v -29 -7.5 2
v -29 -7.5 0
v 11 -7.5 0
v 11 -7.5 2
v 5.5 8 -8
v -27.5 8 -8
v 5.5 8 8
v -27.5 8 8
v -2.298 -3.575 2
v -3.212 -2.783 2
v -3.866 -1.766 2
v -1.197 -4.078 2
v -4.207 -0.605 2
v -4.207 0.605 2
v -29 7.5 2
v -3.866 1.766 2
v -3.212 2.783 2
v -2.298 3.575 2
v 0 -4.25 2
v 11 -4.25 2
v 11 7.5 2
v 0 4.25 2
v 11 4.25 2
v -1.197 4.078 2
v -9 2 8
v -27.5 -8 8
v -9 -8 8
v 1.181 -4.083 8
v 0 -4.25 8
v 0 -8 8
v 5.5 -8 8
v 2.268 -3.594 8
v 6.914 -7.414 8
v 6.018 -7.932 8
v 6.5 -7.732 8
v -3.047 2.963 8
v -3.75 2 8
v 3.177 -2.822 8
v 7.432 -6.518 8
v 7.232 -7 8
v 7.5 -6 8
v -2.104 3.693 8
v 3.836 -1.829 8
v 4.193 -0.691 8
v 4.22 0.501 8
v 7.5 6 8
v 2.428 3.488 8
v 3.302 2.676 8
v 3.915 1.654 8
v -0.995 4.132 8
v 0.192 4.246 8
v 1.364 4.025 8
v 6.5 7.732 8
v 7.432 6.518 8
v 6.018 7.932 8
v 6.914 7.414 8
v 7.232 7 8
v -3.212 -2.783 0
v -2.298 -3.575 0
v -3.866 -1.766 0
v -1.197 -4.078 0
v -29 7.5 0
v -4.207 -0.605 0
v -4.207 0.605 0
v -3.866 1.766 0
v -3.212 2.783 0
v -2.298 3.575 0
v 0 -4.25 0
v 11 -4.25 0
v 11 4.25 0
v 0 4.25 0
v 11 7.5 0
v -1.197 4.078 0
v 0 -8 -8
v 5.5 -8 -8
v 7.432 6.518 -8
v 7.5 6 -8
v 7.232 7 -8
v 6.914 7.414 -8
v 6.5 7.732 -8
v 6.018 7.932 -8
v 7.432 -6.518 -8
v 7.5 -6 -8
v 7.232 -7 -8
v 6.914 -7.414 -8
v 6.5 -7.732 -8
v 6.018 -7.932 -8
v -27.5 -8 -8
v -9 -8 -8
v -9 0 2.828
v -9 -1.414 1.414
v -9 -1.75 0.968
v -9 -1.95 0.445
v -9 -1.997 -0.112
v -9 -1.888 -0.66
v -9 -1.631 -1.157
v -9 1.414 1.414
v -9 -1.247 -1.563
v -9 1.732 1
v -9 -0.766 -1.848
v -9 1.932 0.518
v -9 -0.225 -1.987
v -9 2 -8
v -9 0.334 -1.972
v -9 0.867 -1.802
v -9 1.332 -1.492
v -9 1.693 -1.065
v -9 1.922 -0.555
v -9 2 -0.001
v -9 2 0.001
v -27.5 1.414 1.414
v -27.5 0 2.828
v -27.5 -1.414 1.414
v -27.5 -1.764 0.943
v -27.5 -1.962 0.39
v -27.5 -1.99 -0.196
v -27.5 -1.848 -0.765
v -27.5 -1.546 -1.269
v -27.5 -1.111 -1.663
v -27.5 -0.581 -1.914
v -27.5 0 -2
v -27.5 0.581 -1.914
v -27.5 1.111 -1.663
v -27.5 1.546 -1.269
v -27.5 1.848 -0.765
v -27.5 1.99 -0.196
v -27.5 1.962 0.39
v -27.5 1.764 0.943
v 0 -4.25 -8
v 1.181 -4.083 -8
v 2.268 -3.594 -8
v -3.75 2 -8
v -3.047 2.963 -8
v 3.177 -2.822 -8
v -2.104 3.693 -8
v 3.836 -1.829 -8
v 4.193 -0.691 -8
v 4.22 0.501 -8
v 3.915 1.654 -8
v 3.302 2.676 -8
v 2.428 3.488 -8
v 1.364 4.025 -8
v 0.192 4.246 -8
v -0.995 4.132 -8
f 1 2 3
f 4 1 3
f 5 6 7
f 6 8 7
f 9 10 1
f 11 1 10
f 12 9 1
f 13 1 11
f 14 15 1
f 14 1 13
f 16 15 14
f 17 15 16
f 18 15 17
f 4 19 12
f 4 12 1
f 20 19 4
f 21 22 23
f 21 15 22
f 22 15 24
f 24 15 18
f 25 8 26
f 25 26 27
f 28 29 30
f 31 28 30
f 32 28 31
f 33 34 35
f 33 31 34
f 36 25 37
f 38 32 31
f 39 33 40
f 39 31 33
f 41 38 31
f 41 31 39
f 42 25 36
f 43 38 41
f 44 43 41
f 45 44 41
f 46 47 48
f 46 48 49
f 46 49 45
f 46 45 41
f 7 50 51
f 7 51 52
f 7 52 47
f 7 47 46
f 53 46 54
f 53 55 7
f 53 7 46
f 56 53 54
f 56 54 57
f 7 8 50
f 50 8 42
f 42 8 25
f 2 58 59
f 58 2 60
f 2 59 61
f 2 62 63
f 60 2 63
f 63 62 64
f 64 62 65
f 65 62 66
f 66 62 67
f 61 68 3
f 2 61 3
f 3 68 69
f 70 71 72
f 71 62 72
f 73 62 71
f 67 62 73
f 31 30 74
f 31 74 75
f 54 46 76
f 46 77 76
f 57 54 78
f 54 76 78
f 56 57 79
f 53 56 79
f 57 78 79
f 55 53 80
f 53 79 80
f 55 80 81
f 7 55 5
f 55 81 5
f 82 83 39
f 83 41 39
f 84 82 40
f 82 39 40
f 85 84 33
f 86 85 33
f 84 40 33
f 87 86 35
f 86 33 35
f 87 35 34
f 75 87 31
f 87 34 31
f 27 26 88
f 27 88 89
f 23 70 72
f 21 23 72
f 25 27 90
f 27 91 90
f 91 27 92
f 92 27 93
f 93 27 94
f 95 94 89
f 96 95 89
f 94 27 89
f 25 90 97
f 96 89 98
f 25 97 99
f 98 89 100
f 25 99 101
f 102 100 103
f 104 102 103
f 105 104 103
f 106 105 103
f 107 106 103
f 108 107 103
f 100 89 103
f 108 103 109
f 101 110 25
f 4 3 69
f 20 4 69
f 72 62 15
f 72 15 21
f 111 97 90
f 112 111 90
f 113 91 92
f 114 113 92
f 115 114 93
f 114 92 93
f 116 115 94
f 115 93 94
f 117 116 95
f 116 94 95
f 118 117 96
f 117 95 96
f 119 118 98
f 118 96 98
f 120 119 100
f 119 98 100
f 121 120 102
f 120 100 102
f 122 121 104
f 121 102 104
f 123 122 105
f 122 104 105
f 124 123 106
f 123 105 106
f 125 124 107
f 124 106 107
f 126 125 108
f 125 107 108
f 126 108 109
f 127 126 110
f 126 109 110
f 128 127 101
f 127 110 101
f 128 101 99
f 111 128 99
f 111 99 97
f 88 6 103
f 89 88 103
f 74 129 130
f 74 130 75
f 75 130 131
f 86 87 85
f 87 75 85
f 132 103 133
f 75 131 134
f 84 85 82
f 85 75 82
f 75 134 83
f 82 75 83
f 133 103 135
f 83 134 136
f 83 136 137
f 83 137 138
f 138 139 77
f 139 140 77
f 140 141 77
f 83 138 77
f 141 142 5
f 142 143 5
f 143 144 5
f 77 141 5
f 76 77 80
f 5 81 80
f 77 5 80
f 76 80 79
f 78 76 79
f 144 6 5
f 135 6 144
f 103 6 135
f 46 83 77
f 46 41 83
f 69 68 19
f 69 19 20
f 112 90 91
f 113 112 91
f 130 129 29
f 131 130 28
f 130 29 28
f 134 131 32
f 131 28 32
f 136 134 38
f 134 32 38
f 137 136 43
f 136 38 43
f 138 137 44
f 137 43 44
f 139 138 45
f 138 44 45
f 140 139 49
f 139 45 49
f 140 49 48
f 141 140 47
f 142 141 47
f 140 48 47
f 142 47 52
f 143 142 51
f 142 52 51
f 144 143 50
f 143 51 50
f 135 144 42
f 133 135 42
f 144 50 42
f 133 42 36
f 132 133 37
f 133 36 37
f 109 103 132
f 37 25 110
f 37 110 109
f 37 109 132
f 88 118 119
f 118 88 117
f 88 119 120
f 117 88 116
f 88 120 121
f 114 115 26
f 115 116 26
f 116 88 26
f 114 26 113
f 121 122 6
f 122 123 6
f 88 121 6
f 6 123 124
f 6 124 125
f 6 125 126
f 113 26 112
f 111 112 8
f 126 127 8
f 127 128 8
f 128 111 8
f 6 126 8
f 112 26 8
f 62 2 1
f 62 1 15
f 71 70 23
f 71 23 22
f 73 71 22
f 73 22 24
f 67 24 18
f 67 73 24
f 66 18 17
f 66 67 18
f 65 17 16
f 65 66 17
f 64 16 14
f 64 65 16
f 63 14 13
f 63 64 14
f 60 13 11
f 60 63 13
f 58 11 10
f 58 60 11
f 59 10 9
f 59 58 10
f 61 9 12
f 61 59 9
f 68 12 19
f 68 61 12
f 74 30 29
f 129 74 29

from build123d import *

# Parameters (mm, degrees)
SKETCH_W             = 40
SKETCH_H             = 15
PAD_DEPTH            = 2
POCKET_DEPTH         = 0.001
POCKET_DEPTH_BACK    = 2.001
SKETCH002_W          = 35
SKETCH002_H          = 16
PAD001_DEPTH         = 8
SKETCH003_R          = 4.25
POCKET001_DEPTH      = 8.001
POCKET001_DEPTH_BACK = 8.001
SKETCH004_W          = 9
SKETCH004_H          = 10
POCKET002_DEPTH      = 8.001
POCKET002_DEPTH_BACK = 8.001
FILLET_R             = 2
POCKET003_DEPTH      = 27.501


with BuildPart() as pl_ttchen:
    # Sketch → Pad (new body)
    with BuildSketch(Plane.XY):
        with Locations((-9, 0)):
            Rectangle(SKETCH_W, SKETCH_H)
    extrude(amount=PAD_DEPTH)

    # Sketch001 → Pocket (cut, two sides)
    with BuildSketch(Plane.XY) as pocket_sk:
        with BuildLine():
            ThreePointArc((0, 4.25), (-4.25, 0), (0, -4.25))
            Line((0, -4.25), (11, -4.25))
            ThreePointArc((11, -4.25), (15.25, 0), (11, 4.25))
            Line((11, 4.25), (0, 4.25))
        make_face()
    extrude(amount=-POCKET_DEPTH, mode=Mode.SUBTRACT)
    extrude(pocket_sk.sketch, amount=POCKET_DEPTH_BACK, mode=Mode.SUBTRACT)


with BuildPart() as zwinge:
    # Sketch002 → Pad001 (new body, symmetric)
    with BuildSketch(Plane.XY):
        with Locations((-10, 0)):
            Rectangle(SKETCH002_W, SKETCH002_H)
    extrude(amount=PAD001_DEPTH, both=True)

    # Sketch003 → Pocket001 (cut, two sides)
    with BuildSketch(Plane.XY) as pocket001_sk:
        Circle(SKETCH003_R)
    extrude(amount=-POCKET001_DEPTH, mode=Mode.SUBTRACT)
    extrude(pocket001_sk.sketch, amount=POCKET001_DEPTH_BACK, mode=Mode.SUBTRACT)

    # Sketch004 → Pocket002 (cut, two sides)
    with BuildSketch(Plane.XY) as pocket002_sk:
        with Locations((-4.5, -3)):
            Rectangle(SKETCH004_W, SKETCH004_H)
    extrude(amount=-POCKET002_DEPTH, mode=Mode.SUBTRACT)
    extrude(pocket002_sk.sketch, amount=POCKET002_DEPTH_BACK, mode=Mode.SUBTRACT)

    # Fillet
    fillet_edges = [zwinge.edges().sort_by_distance(p)[0] for p in [
        (7.5, -8, 0),
        (7.5, 8, 0),
    ]]
    fillet(fillet_edges, radius=FILLET_R)

    # Sketch005 → Pocket003 (cut, through all)
    with BuildSketch(Plane.YZ):
        with BuildLine():
            Line((0, 2.828427), (-1.414214, 1.414214))
            ThreePointArc((-1.414214, 1.414214), (0, -2), (1.414214, 1.414214))
            Line((1.414214, 1.414214), (0, 2.828427))
        make_face()
    extrude(amount=-POCKET003_DEPTH, mode=Mode.SUBTRACT)


solid = Compound([pl_ttchen.part, zwinge.part])
